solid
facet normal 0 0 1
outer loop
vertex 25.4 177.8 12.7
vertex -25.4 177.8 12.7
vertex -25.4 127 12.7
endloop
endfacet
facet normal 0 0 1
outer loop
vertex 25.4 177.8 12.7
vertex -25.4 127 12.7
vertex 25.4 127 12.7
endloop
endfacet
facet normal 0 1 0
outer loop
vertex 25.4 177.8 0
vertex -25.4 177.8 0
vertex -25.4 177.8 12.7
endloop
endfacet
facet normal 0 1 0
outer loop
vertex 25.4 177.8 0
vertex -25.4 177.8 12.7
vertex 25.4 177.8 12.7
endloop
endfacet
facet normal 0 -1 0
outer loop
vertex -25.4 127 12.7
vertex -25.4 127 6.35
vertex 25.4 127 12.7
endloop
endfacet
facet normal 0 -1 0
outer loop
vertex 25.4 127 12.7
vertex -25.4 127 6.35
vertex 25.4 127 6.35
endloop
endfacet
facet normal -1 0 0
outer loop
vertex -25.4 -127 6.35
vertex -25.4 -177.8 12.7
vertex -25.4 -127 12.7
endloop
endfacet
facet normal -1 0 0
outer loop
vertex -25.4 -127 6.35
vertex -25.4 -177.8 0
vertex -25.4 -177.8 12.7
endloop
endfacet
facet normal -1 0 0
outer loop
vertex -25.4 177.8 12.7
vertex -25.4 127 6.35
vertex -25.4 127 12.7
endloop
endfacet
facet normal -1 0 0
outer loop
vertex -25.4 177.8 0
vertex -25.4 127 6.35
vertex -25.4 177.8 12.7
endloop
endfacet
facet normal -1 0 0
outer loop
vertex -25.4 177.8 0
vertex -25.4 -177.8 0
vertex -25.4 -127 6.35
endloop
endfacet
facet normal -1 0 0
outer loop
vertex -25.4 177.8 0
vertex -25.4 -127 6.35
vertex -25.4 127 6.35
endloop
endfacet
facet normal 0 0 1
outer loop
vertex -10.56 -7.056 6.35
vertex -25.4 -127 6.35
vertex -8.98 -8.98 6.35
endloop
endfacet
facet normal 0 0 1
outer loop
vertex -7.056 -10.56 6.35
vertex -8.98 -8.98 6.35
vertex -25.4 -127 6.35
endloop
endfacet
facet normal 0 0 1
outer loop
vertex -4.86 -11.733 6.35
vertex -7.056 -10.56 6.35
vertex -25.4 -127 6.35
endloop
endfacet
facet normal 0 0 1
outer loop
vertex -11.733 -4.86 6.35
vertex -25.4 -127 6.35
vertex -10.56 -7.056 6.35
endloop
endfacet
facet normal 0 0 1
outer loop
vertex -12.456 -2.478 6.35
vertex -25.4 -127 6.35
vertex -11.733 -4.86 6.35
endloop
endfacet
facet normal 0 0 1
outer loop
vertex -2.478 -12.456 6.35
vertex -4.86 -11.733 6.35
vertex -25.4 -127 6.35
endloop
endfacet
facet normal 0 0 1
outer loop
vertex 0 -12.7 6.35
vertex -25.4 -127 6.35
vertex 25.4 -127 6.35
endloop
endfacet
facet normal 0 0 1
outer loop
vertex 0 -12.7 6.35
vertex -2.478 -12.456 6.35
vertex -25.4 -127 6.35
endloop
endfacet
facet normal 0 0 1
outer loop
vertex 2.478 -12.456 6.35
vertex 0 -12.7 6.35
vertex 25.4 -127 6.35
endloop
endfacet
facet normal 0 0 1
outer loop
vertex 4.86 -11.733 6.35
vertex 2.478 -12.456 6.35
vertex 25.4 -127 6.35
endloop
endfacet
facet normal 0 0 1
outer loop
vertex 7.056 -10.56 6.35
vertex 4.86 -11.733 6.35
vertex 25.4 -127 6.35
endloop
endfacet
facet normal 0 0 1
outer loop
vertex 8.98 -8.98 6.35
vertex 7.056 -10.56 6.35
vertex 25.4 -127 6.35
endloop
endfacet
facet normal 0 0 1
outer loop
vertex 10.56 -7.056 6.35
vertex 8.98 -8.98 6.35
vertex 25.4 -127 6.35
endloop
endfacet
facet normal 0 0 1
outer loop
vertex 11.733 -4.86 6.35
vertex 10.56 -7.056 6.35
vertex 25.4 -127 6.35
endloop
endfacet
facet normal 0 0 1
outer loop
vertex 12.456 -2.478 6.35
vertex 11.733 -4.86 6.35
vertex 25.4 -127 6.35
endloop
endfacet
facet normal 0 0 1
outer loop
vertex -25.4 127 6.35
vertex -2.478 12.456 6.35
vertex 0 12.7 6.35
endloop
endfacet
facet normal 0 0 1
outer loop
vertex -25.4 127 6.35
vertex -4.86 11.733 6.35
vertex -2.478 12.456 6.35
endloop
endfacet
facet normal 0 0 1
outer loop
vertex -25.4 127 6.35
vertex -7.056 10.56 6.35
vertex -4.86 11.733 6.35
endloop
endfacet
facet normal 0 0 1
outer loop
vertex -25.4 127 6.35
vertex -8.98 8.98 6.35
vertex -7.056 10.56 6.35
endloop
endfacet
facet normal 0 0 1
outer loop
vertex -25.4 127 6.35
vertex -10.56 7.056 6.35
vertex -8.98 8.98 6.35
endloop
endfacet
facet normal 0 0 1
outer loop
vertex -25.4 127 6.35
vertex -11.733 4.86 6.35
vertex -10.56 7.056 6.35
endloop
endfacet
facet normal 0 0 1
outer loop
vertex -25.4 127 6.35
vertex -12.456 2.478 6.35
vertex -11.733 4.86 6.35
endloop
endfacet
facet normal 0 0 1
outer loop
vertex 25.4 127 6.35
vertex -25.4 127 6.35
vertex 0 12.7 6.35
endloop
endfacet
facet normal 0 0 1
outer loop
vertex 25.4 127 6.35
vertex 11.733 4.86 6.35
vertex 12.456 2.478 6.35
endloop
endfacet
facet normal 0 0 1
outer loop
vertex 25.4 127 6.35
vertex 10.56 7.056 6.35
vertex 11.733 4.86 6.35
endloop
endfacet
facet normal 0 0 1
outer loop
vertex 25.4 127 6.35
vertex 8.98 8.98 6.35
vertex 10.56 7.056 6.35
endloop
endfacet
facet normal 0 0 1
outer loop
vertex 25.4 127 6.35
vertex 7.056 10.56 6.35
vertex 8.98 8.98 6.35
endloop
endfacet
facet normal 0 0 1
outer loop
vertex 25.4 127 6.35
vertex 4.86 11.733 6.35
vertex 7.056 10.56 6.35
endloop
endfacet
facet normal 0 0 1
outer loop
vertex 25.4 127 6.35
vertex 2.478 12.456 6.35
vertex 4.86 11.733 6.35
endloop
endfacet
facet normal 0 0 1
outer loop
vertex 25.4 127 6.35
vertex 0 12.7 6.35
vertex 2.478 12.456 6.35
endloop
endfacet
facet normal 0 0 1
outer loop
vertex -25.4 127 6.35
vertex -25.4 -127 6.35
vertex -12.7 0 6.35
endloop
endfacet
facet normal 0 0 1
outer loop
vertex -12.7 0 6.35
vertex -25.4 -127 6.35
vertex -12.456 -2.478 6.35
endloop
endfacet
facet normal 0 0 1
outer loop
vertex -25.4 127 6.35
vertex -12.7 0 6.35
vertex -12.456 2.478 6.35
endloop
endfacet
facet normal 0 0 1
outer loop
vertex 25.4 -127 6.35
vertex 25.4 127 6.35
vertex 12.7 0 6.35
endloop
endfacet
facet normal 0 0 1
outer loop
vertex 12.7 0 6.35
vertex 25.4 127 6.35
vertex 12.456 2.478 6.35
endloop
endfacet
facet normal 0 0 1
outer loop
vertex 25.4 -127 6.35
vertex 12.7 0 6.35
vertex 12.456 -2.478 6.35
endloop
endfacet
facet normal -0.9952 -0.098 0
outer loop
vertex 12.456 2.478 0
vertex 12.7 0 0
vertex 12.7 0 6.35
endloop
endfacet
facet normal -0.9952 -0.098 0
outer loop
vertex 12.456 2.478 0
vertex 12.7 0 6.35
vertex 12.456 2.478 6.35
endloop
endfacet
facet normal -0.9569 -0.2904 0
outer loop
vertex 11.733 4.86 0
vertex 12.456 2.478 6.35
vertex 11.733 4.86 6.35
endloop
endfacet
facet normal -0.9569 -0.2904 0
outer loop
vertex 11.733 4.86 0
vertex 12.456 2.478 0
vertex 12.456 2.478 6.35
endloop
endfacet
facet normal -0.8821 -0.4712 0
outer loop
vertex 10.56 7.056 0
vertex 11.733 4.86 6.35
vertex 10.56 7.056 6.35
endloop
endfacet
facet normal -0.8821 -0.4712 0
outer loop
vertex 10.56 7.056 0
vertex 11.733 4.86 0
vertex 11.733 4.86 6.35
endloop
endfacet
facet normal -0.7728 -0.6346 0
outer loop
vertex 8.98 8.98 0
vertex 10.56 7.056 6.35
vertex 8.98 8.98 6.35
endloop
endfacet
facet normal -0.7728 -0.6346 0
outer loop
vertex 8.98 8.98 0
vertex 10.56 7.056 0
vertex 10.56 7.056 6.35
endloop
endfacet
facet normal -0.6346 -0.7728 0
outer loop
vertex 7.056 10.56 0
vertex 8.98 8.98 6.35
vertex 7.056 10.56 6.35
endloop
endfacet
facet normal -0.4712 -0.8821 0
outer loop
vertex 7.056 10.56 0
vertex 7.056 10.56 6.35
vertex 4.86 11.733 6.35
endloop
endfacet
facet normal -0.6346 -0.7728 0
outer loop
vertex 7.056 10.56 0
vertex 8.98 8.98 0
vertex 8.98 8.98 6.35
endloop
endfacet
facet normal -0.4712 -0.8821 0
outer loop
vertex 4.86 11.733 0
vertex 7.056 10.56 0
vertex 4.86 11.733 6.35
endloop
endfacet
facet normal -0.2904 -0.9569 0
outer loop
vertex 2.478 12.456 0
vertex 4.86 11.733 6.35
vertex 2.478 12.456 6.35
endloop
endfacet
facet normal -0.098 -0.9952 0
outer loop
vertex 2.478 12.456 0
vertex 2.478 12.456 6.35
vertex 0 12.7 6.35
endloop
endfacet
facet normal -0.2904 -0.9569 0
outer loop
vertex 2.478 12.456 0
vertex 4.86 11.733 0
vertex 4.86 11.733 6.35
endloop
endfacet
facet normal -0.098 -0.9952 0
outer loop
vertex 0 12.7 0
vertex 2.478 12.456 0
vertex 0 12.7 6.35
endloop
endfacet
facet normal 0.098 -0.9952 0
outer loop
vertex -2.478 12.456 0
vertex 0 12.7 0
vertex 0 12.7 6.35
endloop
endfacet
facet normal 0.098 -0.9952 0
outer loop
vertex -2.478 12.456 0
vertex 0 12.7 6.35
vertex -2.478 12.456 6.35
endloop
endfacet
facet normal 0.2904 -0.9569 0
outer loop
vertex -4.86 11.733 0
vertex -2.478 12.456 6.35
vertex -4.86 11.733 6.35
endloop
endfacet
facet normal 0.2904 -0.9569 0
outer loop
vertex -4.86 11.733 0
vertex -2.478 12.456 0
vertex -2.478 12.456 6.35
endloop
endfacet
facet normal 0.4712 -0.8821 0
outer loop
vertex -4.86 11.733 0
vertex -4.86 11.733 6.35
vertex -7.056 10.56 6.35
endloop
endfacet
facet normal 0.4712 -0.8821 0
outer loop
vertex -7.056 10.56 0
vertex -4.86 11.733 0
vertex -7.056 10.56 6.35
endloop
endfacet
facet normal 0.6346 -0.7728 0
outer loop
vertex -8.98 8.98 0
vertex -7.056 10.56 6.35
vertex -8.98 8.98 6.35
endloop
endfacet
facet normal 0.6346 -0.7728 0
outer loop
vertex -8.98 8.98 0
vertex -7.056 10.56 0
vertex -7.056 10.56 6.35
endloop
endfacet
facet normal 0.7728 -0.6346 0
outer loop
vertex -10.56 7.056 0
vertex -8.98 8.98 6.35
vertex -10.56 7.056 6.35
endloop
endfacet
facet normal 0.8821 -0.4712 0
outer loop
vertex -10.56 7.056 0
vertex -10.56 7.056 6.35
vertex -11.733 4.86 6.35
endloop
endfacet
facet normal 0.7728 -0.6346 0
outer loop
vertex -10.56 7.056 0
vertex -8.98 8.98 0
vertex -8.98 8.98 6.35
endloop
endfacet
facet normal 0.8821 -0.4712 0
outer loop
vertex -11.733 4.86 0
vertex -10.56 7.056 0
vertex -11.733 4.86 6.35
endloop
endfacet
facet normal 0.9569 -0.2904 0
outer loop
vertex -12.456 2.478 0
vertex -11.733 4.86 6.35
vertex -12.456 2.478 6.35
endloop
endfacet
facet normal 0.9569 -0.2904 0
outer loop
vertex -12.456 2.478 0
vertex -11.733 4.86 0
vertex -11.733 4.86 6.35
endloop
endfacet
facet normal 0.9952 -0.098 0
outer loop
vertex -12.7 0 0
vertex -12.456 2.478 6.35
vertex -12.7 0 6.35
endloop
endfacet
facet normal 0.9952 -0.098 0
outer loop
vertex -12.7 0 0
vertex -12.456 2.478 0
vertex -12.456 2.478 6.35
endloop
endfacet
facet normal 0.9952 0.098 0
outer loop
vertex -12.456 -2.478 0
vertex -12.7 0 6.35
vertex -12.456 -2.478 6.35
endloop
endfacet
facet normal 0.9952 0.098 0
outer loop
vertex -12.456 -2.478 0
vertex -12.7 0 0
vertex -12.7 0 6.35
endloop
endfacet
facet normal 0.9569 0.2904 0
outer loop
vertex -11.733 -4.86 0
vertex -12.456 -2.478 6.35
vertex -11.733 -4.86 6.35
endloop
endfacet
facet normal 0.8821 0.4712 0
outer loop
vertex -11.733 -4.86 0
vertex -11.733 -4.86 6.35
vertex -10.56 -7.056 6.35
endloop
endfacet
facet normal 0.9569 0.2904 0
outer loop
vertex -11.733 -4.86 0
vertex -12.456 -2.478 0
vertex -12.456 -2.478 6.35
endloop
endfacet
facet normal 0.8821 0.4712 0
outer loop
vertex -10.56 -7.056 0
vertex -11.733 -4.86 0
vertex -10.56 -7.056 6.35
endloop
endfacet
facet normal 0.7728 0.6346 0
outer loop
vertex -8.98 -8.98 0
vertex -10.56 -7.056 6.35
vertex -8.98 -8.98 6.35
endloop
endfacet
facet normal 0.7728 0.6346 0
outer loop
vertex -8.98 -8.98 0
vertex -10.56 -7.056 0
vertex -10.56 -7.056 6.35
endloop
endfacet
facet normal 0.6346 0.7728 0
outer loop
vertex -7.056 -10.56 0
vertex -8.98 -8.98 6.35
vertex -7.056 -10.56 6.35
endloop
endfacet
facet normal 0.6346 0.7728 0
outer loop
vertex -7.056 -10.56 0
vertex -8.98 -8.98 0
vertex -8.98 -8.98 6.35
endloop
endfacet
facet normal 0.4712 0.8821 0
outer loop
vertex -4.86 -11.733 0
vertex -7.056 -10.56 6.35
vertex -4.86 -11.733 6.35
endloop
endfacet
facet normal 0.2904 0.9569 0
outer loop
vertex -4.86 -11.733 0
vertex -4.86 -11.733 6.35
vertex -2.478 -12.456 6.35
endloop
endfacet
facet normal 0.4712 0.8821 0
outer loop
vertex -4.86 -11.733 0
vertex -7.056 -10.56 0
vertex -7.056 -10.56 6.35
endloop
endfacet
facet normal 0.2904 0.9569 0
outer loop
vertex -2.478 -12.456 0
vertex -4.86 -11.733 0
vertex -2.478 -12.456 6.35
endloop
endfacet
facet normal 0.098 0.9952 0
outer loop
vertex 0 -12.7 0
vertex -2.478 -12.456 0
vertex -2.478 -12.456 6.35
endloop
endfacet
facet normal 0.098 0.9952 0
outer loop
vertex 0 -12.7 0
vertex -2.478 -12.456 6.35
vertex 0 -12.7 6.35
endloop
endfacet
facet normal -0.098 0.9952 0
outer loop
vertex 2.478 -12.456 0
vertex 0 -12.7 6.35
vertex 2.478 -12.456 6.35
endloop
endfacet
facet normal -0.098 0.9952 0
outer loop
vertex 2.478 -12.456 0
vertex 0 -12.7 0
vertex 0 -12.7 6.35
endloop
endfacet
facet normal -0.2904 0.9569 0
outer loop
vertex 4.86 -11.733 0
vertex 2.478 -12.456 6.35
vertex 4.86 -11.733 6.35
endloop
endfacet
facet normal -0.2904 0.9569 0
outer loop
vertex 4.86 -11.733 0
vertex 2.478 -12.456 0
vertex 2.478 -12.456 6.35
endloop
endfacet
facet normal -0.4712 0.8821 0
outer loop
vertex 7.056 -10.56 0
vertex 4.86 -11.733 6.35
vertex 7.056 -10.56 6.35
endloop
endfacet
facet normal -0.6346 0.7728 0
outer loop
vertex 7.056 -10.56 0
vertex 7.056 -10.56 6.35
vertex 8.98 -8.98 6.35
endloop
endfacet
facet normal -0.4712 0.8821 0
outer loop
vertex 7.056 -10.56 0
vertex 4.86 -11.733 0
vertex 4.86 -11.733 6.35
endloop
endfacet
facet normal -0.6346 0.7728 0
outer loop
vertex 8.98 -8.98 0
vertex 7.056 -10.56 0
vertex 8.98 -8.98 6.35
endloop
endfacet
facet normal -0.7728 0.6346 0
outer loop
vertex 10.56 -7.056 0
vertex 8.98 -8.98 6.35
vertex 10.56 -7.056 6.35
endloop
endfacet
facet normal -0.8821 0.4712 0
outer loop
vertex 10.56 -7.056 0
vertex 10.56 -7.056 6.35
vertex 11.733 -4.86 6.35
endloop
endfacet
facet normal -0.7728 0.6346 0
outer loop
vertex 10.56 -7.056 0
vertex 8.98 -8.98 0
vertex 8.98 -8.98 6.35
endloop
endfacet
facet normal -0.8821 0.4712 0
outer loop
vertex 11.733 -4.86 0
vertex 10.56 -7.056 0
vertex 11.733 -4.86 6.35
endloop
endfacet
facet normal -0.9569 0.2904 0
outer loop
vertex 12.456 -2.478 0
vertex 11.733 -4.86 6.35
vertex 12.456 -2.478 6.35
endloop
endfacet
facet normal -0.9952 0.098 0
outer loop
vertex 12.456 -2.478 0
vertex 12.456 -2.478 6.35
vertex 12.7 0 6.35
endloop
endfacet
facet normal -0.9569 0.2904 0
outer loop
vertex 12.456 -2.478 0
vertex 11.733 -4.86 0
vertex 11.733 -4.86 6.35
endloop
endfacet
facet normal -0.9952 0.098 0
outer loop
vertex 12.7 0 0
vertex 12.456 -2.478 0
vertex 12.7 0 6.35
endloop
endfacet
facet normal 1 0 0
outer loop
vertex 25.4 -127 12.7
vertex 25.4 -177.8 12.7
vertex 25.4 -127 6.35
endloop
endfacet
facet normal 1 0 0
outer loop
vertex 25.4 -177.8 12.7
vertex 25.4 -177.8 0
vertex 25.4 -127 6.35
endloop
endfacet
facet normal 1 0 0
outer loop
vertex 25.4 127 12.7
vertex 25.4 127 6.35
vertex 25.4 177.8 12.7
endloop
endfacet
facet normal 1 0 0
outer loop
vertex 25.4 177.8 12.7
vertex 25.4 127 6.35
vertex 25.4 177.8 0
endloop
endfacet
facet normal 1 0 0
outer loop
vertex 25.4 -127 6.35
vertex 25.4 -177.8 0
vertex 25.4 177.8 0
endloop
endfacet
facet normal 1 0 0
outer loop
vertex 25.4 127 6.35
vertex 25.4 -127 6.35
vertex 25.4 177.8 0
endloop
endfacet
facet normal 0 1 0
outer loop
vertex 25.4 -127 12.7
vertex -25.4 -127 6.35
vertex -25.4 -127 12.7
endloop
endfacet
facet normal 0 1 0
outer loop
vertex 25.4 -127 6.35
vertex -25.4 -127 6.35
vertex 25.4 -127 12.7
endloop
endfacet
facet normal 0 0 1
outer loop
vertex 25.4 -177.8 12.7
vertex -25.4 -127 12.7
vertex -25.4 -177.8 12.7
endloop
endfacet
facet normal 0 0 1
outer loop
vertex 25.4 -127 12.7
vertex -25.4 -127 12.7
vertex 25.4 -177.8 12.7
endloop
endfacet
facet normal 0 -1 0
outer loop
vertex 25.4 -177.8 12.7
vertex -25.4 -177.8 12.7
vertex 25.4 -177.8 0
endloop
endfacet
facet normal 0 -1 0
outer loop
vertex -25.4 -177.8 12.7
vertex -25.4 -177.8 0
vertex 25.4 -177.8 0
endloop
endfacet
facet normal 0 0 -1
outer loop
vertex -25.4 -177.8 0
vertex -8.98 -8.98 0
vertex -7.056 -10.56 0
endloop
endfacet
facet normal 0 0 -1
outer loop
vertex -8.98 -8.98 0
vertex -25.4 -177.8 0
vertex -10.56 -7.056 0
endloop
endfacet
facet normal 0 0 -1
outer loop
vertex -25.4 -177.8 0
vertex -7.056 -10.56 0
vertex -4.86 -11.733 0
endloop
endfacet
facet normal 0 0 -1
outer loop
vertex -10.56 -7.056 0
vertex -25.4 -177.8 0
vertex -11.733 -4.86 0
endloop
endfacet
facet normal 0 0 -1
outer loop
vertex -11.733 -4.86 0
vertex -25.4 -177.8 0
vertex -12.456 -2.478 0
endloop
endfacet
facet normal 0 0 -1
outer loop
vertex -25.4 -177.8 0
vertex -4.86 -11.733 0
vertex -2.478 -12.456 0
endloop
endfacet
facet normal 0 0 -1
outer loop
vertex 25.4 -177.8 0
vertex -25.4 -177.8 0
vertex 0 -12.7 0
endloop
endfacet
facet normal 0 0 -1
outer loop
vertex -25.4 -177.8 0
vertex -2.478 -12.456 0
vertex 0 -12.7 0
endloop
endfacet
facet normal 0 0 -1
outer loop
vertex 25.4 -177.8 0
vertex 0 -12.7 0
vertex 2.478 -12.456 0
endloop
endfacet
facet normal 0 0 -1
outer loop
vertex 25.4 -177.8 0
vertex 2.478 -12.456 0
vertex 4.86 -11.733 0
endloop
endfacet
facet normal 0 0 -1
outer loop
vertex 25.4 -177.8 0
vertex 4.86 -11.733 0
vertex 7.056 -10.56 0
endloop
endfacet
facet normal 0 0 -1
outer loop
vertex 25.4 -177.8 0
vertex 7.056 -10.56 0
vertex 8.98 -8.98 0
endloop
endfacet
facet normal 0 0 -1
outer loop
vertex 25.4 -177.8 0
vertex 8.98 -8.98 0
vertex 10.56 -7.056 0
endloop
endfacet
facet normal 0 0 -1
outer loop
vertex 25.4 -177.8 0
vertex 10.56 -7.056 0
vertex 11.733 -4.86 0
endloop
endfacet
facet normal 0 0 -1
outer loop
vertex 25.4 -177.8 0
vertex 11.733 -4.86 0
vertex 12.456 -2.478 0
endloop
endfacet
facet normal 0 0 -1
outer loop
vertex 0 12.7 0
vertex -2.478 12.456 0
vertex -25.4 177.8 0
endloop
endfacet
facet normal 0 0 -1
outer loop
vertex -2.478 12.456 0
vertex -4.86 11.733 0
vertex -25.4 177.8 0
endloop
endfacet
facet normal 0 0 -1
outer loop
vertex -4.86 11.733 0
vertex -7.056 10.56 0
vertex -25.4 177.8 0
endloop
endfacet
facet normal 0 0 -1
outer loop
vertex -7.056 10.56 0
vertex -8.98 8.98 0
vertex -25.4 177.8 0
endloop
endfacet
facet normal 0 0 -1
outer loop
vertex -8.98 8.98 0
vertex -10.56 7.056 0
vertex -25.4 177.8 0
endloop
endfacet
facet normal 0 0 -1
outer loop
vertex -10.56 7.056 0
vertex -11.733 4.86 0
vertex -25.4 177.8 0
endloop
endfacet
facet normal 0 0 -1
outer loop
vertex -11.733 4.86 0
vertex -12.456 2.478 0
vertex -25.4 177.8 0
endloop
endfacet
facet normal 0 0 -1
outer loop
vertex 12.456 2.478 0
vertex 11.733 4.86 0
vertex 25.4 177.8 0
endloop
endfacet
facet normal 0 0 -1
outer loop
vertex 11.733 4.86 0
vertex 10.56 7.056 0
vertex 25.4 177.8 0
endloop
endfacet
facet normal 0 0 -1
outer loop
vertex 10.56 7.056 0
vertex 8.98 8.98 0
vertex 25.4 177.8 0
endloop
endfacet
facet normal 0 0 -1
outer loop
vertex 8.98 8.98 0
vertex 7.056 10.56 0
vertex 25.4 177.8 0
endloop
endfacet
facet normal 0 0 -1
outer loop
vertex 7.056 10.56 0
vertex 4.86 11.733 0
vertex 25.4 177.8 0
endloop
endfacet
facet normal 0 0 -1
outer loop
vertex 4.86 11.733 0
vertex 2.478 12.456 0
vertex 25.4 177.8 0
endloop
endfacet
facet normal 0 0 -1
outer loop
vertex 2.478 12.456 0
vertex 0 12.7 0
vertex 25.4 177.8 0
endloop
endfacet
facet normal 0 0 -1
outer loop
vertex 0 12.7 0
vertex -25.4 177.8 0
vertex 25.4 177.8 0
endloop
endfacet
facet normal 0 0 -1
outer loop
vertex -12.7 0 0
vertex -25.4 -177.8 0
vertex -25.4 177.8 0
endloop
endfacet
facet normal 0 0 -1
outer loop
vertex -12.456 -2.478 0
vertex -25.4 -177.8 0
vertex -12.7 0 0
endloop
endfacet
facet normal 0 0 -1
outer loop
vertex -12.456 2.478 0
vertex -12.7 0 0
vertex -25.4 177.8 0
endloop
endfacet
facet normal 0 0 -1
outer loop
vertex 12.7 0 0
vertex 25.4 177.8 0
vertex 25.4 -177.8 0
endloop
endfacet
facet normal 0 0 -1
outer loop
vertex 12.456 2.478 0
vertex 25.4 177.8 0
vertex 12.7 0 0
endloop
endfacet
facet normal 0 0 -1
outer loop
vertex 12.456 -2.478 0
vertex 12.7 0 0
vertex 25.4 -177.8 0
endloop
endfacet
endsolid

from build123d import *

# Parameters (mm, degrees)
F0_W     = 50.8
F0_H     = 355.6
F0_R     = 12.7
F1_DEPTH = 6.35
F2_W     = 50.8
F2_H     = 50.8
F3_DEPTH = 6.35


with BuildPart() as f1:
    # F0 (on Top) → F1 (new body)
    with BuildSketch(Plane.XY):
        Rectangle(F0_W, F0_H)
        Circle(F0_R, mode=Mode.SUBTRACT)
    extrude(amount=F1_DEPTH)

    # F2 (on face) → F3 (join)
    with BuildSketch(Plane.XY.offset(6.35)):
        with Locations((0, -152.4)):
            Rectangle(F2_W, F2_H)
        with Locations((0, 152.4)):
            Rectangle(F2_W, F2_H)
    extrude(amount=F3_DEPTH)


solid = f1.part
